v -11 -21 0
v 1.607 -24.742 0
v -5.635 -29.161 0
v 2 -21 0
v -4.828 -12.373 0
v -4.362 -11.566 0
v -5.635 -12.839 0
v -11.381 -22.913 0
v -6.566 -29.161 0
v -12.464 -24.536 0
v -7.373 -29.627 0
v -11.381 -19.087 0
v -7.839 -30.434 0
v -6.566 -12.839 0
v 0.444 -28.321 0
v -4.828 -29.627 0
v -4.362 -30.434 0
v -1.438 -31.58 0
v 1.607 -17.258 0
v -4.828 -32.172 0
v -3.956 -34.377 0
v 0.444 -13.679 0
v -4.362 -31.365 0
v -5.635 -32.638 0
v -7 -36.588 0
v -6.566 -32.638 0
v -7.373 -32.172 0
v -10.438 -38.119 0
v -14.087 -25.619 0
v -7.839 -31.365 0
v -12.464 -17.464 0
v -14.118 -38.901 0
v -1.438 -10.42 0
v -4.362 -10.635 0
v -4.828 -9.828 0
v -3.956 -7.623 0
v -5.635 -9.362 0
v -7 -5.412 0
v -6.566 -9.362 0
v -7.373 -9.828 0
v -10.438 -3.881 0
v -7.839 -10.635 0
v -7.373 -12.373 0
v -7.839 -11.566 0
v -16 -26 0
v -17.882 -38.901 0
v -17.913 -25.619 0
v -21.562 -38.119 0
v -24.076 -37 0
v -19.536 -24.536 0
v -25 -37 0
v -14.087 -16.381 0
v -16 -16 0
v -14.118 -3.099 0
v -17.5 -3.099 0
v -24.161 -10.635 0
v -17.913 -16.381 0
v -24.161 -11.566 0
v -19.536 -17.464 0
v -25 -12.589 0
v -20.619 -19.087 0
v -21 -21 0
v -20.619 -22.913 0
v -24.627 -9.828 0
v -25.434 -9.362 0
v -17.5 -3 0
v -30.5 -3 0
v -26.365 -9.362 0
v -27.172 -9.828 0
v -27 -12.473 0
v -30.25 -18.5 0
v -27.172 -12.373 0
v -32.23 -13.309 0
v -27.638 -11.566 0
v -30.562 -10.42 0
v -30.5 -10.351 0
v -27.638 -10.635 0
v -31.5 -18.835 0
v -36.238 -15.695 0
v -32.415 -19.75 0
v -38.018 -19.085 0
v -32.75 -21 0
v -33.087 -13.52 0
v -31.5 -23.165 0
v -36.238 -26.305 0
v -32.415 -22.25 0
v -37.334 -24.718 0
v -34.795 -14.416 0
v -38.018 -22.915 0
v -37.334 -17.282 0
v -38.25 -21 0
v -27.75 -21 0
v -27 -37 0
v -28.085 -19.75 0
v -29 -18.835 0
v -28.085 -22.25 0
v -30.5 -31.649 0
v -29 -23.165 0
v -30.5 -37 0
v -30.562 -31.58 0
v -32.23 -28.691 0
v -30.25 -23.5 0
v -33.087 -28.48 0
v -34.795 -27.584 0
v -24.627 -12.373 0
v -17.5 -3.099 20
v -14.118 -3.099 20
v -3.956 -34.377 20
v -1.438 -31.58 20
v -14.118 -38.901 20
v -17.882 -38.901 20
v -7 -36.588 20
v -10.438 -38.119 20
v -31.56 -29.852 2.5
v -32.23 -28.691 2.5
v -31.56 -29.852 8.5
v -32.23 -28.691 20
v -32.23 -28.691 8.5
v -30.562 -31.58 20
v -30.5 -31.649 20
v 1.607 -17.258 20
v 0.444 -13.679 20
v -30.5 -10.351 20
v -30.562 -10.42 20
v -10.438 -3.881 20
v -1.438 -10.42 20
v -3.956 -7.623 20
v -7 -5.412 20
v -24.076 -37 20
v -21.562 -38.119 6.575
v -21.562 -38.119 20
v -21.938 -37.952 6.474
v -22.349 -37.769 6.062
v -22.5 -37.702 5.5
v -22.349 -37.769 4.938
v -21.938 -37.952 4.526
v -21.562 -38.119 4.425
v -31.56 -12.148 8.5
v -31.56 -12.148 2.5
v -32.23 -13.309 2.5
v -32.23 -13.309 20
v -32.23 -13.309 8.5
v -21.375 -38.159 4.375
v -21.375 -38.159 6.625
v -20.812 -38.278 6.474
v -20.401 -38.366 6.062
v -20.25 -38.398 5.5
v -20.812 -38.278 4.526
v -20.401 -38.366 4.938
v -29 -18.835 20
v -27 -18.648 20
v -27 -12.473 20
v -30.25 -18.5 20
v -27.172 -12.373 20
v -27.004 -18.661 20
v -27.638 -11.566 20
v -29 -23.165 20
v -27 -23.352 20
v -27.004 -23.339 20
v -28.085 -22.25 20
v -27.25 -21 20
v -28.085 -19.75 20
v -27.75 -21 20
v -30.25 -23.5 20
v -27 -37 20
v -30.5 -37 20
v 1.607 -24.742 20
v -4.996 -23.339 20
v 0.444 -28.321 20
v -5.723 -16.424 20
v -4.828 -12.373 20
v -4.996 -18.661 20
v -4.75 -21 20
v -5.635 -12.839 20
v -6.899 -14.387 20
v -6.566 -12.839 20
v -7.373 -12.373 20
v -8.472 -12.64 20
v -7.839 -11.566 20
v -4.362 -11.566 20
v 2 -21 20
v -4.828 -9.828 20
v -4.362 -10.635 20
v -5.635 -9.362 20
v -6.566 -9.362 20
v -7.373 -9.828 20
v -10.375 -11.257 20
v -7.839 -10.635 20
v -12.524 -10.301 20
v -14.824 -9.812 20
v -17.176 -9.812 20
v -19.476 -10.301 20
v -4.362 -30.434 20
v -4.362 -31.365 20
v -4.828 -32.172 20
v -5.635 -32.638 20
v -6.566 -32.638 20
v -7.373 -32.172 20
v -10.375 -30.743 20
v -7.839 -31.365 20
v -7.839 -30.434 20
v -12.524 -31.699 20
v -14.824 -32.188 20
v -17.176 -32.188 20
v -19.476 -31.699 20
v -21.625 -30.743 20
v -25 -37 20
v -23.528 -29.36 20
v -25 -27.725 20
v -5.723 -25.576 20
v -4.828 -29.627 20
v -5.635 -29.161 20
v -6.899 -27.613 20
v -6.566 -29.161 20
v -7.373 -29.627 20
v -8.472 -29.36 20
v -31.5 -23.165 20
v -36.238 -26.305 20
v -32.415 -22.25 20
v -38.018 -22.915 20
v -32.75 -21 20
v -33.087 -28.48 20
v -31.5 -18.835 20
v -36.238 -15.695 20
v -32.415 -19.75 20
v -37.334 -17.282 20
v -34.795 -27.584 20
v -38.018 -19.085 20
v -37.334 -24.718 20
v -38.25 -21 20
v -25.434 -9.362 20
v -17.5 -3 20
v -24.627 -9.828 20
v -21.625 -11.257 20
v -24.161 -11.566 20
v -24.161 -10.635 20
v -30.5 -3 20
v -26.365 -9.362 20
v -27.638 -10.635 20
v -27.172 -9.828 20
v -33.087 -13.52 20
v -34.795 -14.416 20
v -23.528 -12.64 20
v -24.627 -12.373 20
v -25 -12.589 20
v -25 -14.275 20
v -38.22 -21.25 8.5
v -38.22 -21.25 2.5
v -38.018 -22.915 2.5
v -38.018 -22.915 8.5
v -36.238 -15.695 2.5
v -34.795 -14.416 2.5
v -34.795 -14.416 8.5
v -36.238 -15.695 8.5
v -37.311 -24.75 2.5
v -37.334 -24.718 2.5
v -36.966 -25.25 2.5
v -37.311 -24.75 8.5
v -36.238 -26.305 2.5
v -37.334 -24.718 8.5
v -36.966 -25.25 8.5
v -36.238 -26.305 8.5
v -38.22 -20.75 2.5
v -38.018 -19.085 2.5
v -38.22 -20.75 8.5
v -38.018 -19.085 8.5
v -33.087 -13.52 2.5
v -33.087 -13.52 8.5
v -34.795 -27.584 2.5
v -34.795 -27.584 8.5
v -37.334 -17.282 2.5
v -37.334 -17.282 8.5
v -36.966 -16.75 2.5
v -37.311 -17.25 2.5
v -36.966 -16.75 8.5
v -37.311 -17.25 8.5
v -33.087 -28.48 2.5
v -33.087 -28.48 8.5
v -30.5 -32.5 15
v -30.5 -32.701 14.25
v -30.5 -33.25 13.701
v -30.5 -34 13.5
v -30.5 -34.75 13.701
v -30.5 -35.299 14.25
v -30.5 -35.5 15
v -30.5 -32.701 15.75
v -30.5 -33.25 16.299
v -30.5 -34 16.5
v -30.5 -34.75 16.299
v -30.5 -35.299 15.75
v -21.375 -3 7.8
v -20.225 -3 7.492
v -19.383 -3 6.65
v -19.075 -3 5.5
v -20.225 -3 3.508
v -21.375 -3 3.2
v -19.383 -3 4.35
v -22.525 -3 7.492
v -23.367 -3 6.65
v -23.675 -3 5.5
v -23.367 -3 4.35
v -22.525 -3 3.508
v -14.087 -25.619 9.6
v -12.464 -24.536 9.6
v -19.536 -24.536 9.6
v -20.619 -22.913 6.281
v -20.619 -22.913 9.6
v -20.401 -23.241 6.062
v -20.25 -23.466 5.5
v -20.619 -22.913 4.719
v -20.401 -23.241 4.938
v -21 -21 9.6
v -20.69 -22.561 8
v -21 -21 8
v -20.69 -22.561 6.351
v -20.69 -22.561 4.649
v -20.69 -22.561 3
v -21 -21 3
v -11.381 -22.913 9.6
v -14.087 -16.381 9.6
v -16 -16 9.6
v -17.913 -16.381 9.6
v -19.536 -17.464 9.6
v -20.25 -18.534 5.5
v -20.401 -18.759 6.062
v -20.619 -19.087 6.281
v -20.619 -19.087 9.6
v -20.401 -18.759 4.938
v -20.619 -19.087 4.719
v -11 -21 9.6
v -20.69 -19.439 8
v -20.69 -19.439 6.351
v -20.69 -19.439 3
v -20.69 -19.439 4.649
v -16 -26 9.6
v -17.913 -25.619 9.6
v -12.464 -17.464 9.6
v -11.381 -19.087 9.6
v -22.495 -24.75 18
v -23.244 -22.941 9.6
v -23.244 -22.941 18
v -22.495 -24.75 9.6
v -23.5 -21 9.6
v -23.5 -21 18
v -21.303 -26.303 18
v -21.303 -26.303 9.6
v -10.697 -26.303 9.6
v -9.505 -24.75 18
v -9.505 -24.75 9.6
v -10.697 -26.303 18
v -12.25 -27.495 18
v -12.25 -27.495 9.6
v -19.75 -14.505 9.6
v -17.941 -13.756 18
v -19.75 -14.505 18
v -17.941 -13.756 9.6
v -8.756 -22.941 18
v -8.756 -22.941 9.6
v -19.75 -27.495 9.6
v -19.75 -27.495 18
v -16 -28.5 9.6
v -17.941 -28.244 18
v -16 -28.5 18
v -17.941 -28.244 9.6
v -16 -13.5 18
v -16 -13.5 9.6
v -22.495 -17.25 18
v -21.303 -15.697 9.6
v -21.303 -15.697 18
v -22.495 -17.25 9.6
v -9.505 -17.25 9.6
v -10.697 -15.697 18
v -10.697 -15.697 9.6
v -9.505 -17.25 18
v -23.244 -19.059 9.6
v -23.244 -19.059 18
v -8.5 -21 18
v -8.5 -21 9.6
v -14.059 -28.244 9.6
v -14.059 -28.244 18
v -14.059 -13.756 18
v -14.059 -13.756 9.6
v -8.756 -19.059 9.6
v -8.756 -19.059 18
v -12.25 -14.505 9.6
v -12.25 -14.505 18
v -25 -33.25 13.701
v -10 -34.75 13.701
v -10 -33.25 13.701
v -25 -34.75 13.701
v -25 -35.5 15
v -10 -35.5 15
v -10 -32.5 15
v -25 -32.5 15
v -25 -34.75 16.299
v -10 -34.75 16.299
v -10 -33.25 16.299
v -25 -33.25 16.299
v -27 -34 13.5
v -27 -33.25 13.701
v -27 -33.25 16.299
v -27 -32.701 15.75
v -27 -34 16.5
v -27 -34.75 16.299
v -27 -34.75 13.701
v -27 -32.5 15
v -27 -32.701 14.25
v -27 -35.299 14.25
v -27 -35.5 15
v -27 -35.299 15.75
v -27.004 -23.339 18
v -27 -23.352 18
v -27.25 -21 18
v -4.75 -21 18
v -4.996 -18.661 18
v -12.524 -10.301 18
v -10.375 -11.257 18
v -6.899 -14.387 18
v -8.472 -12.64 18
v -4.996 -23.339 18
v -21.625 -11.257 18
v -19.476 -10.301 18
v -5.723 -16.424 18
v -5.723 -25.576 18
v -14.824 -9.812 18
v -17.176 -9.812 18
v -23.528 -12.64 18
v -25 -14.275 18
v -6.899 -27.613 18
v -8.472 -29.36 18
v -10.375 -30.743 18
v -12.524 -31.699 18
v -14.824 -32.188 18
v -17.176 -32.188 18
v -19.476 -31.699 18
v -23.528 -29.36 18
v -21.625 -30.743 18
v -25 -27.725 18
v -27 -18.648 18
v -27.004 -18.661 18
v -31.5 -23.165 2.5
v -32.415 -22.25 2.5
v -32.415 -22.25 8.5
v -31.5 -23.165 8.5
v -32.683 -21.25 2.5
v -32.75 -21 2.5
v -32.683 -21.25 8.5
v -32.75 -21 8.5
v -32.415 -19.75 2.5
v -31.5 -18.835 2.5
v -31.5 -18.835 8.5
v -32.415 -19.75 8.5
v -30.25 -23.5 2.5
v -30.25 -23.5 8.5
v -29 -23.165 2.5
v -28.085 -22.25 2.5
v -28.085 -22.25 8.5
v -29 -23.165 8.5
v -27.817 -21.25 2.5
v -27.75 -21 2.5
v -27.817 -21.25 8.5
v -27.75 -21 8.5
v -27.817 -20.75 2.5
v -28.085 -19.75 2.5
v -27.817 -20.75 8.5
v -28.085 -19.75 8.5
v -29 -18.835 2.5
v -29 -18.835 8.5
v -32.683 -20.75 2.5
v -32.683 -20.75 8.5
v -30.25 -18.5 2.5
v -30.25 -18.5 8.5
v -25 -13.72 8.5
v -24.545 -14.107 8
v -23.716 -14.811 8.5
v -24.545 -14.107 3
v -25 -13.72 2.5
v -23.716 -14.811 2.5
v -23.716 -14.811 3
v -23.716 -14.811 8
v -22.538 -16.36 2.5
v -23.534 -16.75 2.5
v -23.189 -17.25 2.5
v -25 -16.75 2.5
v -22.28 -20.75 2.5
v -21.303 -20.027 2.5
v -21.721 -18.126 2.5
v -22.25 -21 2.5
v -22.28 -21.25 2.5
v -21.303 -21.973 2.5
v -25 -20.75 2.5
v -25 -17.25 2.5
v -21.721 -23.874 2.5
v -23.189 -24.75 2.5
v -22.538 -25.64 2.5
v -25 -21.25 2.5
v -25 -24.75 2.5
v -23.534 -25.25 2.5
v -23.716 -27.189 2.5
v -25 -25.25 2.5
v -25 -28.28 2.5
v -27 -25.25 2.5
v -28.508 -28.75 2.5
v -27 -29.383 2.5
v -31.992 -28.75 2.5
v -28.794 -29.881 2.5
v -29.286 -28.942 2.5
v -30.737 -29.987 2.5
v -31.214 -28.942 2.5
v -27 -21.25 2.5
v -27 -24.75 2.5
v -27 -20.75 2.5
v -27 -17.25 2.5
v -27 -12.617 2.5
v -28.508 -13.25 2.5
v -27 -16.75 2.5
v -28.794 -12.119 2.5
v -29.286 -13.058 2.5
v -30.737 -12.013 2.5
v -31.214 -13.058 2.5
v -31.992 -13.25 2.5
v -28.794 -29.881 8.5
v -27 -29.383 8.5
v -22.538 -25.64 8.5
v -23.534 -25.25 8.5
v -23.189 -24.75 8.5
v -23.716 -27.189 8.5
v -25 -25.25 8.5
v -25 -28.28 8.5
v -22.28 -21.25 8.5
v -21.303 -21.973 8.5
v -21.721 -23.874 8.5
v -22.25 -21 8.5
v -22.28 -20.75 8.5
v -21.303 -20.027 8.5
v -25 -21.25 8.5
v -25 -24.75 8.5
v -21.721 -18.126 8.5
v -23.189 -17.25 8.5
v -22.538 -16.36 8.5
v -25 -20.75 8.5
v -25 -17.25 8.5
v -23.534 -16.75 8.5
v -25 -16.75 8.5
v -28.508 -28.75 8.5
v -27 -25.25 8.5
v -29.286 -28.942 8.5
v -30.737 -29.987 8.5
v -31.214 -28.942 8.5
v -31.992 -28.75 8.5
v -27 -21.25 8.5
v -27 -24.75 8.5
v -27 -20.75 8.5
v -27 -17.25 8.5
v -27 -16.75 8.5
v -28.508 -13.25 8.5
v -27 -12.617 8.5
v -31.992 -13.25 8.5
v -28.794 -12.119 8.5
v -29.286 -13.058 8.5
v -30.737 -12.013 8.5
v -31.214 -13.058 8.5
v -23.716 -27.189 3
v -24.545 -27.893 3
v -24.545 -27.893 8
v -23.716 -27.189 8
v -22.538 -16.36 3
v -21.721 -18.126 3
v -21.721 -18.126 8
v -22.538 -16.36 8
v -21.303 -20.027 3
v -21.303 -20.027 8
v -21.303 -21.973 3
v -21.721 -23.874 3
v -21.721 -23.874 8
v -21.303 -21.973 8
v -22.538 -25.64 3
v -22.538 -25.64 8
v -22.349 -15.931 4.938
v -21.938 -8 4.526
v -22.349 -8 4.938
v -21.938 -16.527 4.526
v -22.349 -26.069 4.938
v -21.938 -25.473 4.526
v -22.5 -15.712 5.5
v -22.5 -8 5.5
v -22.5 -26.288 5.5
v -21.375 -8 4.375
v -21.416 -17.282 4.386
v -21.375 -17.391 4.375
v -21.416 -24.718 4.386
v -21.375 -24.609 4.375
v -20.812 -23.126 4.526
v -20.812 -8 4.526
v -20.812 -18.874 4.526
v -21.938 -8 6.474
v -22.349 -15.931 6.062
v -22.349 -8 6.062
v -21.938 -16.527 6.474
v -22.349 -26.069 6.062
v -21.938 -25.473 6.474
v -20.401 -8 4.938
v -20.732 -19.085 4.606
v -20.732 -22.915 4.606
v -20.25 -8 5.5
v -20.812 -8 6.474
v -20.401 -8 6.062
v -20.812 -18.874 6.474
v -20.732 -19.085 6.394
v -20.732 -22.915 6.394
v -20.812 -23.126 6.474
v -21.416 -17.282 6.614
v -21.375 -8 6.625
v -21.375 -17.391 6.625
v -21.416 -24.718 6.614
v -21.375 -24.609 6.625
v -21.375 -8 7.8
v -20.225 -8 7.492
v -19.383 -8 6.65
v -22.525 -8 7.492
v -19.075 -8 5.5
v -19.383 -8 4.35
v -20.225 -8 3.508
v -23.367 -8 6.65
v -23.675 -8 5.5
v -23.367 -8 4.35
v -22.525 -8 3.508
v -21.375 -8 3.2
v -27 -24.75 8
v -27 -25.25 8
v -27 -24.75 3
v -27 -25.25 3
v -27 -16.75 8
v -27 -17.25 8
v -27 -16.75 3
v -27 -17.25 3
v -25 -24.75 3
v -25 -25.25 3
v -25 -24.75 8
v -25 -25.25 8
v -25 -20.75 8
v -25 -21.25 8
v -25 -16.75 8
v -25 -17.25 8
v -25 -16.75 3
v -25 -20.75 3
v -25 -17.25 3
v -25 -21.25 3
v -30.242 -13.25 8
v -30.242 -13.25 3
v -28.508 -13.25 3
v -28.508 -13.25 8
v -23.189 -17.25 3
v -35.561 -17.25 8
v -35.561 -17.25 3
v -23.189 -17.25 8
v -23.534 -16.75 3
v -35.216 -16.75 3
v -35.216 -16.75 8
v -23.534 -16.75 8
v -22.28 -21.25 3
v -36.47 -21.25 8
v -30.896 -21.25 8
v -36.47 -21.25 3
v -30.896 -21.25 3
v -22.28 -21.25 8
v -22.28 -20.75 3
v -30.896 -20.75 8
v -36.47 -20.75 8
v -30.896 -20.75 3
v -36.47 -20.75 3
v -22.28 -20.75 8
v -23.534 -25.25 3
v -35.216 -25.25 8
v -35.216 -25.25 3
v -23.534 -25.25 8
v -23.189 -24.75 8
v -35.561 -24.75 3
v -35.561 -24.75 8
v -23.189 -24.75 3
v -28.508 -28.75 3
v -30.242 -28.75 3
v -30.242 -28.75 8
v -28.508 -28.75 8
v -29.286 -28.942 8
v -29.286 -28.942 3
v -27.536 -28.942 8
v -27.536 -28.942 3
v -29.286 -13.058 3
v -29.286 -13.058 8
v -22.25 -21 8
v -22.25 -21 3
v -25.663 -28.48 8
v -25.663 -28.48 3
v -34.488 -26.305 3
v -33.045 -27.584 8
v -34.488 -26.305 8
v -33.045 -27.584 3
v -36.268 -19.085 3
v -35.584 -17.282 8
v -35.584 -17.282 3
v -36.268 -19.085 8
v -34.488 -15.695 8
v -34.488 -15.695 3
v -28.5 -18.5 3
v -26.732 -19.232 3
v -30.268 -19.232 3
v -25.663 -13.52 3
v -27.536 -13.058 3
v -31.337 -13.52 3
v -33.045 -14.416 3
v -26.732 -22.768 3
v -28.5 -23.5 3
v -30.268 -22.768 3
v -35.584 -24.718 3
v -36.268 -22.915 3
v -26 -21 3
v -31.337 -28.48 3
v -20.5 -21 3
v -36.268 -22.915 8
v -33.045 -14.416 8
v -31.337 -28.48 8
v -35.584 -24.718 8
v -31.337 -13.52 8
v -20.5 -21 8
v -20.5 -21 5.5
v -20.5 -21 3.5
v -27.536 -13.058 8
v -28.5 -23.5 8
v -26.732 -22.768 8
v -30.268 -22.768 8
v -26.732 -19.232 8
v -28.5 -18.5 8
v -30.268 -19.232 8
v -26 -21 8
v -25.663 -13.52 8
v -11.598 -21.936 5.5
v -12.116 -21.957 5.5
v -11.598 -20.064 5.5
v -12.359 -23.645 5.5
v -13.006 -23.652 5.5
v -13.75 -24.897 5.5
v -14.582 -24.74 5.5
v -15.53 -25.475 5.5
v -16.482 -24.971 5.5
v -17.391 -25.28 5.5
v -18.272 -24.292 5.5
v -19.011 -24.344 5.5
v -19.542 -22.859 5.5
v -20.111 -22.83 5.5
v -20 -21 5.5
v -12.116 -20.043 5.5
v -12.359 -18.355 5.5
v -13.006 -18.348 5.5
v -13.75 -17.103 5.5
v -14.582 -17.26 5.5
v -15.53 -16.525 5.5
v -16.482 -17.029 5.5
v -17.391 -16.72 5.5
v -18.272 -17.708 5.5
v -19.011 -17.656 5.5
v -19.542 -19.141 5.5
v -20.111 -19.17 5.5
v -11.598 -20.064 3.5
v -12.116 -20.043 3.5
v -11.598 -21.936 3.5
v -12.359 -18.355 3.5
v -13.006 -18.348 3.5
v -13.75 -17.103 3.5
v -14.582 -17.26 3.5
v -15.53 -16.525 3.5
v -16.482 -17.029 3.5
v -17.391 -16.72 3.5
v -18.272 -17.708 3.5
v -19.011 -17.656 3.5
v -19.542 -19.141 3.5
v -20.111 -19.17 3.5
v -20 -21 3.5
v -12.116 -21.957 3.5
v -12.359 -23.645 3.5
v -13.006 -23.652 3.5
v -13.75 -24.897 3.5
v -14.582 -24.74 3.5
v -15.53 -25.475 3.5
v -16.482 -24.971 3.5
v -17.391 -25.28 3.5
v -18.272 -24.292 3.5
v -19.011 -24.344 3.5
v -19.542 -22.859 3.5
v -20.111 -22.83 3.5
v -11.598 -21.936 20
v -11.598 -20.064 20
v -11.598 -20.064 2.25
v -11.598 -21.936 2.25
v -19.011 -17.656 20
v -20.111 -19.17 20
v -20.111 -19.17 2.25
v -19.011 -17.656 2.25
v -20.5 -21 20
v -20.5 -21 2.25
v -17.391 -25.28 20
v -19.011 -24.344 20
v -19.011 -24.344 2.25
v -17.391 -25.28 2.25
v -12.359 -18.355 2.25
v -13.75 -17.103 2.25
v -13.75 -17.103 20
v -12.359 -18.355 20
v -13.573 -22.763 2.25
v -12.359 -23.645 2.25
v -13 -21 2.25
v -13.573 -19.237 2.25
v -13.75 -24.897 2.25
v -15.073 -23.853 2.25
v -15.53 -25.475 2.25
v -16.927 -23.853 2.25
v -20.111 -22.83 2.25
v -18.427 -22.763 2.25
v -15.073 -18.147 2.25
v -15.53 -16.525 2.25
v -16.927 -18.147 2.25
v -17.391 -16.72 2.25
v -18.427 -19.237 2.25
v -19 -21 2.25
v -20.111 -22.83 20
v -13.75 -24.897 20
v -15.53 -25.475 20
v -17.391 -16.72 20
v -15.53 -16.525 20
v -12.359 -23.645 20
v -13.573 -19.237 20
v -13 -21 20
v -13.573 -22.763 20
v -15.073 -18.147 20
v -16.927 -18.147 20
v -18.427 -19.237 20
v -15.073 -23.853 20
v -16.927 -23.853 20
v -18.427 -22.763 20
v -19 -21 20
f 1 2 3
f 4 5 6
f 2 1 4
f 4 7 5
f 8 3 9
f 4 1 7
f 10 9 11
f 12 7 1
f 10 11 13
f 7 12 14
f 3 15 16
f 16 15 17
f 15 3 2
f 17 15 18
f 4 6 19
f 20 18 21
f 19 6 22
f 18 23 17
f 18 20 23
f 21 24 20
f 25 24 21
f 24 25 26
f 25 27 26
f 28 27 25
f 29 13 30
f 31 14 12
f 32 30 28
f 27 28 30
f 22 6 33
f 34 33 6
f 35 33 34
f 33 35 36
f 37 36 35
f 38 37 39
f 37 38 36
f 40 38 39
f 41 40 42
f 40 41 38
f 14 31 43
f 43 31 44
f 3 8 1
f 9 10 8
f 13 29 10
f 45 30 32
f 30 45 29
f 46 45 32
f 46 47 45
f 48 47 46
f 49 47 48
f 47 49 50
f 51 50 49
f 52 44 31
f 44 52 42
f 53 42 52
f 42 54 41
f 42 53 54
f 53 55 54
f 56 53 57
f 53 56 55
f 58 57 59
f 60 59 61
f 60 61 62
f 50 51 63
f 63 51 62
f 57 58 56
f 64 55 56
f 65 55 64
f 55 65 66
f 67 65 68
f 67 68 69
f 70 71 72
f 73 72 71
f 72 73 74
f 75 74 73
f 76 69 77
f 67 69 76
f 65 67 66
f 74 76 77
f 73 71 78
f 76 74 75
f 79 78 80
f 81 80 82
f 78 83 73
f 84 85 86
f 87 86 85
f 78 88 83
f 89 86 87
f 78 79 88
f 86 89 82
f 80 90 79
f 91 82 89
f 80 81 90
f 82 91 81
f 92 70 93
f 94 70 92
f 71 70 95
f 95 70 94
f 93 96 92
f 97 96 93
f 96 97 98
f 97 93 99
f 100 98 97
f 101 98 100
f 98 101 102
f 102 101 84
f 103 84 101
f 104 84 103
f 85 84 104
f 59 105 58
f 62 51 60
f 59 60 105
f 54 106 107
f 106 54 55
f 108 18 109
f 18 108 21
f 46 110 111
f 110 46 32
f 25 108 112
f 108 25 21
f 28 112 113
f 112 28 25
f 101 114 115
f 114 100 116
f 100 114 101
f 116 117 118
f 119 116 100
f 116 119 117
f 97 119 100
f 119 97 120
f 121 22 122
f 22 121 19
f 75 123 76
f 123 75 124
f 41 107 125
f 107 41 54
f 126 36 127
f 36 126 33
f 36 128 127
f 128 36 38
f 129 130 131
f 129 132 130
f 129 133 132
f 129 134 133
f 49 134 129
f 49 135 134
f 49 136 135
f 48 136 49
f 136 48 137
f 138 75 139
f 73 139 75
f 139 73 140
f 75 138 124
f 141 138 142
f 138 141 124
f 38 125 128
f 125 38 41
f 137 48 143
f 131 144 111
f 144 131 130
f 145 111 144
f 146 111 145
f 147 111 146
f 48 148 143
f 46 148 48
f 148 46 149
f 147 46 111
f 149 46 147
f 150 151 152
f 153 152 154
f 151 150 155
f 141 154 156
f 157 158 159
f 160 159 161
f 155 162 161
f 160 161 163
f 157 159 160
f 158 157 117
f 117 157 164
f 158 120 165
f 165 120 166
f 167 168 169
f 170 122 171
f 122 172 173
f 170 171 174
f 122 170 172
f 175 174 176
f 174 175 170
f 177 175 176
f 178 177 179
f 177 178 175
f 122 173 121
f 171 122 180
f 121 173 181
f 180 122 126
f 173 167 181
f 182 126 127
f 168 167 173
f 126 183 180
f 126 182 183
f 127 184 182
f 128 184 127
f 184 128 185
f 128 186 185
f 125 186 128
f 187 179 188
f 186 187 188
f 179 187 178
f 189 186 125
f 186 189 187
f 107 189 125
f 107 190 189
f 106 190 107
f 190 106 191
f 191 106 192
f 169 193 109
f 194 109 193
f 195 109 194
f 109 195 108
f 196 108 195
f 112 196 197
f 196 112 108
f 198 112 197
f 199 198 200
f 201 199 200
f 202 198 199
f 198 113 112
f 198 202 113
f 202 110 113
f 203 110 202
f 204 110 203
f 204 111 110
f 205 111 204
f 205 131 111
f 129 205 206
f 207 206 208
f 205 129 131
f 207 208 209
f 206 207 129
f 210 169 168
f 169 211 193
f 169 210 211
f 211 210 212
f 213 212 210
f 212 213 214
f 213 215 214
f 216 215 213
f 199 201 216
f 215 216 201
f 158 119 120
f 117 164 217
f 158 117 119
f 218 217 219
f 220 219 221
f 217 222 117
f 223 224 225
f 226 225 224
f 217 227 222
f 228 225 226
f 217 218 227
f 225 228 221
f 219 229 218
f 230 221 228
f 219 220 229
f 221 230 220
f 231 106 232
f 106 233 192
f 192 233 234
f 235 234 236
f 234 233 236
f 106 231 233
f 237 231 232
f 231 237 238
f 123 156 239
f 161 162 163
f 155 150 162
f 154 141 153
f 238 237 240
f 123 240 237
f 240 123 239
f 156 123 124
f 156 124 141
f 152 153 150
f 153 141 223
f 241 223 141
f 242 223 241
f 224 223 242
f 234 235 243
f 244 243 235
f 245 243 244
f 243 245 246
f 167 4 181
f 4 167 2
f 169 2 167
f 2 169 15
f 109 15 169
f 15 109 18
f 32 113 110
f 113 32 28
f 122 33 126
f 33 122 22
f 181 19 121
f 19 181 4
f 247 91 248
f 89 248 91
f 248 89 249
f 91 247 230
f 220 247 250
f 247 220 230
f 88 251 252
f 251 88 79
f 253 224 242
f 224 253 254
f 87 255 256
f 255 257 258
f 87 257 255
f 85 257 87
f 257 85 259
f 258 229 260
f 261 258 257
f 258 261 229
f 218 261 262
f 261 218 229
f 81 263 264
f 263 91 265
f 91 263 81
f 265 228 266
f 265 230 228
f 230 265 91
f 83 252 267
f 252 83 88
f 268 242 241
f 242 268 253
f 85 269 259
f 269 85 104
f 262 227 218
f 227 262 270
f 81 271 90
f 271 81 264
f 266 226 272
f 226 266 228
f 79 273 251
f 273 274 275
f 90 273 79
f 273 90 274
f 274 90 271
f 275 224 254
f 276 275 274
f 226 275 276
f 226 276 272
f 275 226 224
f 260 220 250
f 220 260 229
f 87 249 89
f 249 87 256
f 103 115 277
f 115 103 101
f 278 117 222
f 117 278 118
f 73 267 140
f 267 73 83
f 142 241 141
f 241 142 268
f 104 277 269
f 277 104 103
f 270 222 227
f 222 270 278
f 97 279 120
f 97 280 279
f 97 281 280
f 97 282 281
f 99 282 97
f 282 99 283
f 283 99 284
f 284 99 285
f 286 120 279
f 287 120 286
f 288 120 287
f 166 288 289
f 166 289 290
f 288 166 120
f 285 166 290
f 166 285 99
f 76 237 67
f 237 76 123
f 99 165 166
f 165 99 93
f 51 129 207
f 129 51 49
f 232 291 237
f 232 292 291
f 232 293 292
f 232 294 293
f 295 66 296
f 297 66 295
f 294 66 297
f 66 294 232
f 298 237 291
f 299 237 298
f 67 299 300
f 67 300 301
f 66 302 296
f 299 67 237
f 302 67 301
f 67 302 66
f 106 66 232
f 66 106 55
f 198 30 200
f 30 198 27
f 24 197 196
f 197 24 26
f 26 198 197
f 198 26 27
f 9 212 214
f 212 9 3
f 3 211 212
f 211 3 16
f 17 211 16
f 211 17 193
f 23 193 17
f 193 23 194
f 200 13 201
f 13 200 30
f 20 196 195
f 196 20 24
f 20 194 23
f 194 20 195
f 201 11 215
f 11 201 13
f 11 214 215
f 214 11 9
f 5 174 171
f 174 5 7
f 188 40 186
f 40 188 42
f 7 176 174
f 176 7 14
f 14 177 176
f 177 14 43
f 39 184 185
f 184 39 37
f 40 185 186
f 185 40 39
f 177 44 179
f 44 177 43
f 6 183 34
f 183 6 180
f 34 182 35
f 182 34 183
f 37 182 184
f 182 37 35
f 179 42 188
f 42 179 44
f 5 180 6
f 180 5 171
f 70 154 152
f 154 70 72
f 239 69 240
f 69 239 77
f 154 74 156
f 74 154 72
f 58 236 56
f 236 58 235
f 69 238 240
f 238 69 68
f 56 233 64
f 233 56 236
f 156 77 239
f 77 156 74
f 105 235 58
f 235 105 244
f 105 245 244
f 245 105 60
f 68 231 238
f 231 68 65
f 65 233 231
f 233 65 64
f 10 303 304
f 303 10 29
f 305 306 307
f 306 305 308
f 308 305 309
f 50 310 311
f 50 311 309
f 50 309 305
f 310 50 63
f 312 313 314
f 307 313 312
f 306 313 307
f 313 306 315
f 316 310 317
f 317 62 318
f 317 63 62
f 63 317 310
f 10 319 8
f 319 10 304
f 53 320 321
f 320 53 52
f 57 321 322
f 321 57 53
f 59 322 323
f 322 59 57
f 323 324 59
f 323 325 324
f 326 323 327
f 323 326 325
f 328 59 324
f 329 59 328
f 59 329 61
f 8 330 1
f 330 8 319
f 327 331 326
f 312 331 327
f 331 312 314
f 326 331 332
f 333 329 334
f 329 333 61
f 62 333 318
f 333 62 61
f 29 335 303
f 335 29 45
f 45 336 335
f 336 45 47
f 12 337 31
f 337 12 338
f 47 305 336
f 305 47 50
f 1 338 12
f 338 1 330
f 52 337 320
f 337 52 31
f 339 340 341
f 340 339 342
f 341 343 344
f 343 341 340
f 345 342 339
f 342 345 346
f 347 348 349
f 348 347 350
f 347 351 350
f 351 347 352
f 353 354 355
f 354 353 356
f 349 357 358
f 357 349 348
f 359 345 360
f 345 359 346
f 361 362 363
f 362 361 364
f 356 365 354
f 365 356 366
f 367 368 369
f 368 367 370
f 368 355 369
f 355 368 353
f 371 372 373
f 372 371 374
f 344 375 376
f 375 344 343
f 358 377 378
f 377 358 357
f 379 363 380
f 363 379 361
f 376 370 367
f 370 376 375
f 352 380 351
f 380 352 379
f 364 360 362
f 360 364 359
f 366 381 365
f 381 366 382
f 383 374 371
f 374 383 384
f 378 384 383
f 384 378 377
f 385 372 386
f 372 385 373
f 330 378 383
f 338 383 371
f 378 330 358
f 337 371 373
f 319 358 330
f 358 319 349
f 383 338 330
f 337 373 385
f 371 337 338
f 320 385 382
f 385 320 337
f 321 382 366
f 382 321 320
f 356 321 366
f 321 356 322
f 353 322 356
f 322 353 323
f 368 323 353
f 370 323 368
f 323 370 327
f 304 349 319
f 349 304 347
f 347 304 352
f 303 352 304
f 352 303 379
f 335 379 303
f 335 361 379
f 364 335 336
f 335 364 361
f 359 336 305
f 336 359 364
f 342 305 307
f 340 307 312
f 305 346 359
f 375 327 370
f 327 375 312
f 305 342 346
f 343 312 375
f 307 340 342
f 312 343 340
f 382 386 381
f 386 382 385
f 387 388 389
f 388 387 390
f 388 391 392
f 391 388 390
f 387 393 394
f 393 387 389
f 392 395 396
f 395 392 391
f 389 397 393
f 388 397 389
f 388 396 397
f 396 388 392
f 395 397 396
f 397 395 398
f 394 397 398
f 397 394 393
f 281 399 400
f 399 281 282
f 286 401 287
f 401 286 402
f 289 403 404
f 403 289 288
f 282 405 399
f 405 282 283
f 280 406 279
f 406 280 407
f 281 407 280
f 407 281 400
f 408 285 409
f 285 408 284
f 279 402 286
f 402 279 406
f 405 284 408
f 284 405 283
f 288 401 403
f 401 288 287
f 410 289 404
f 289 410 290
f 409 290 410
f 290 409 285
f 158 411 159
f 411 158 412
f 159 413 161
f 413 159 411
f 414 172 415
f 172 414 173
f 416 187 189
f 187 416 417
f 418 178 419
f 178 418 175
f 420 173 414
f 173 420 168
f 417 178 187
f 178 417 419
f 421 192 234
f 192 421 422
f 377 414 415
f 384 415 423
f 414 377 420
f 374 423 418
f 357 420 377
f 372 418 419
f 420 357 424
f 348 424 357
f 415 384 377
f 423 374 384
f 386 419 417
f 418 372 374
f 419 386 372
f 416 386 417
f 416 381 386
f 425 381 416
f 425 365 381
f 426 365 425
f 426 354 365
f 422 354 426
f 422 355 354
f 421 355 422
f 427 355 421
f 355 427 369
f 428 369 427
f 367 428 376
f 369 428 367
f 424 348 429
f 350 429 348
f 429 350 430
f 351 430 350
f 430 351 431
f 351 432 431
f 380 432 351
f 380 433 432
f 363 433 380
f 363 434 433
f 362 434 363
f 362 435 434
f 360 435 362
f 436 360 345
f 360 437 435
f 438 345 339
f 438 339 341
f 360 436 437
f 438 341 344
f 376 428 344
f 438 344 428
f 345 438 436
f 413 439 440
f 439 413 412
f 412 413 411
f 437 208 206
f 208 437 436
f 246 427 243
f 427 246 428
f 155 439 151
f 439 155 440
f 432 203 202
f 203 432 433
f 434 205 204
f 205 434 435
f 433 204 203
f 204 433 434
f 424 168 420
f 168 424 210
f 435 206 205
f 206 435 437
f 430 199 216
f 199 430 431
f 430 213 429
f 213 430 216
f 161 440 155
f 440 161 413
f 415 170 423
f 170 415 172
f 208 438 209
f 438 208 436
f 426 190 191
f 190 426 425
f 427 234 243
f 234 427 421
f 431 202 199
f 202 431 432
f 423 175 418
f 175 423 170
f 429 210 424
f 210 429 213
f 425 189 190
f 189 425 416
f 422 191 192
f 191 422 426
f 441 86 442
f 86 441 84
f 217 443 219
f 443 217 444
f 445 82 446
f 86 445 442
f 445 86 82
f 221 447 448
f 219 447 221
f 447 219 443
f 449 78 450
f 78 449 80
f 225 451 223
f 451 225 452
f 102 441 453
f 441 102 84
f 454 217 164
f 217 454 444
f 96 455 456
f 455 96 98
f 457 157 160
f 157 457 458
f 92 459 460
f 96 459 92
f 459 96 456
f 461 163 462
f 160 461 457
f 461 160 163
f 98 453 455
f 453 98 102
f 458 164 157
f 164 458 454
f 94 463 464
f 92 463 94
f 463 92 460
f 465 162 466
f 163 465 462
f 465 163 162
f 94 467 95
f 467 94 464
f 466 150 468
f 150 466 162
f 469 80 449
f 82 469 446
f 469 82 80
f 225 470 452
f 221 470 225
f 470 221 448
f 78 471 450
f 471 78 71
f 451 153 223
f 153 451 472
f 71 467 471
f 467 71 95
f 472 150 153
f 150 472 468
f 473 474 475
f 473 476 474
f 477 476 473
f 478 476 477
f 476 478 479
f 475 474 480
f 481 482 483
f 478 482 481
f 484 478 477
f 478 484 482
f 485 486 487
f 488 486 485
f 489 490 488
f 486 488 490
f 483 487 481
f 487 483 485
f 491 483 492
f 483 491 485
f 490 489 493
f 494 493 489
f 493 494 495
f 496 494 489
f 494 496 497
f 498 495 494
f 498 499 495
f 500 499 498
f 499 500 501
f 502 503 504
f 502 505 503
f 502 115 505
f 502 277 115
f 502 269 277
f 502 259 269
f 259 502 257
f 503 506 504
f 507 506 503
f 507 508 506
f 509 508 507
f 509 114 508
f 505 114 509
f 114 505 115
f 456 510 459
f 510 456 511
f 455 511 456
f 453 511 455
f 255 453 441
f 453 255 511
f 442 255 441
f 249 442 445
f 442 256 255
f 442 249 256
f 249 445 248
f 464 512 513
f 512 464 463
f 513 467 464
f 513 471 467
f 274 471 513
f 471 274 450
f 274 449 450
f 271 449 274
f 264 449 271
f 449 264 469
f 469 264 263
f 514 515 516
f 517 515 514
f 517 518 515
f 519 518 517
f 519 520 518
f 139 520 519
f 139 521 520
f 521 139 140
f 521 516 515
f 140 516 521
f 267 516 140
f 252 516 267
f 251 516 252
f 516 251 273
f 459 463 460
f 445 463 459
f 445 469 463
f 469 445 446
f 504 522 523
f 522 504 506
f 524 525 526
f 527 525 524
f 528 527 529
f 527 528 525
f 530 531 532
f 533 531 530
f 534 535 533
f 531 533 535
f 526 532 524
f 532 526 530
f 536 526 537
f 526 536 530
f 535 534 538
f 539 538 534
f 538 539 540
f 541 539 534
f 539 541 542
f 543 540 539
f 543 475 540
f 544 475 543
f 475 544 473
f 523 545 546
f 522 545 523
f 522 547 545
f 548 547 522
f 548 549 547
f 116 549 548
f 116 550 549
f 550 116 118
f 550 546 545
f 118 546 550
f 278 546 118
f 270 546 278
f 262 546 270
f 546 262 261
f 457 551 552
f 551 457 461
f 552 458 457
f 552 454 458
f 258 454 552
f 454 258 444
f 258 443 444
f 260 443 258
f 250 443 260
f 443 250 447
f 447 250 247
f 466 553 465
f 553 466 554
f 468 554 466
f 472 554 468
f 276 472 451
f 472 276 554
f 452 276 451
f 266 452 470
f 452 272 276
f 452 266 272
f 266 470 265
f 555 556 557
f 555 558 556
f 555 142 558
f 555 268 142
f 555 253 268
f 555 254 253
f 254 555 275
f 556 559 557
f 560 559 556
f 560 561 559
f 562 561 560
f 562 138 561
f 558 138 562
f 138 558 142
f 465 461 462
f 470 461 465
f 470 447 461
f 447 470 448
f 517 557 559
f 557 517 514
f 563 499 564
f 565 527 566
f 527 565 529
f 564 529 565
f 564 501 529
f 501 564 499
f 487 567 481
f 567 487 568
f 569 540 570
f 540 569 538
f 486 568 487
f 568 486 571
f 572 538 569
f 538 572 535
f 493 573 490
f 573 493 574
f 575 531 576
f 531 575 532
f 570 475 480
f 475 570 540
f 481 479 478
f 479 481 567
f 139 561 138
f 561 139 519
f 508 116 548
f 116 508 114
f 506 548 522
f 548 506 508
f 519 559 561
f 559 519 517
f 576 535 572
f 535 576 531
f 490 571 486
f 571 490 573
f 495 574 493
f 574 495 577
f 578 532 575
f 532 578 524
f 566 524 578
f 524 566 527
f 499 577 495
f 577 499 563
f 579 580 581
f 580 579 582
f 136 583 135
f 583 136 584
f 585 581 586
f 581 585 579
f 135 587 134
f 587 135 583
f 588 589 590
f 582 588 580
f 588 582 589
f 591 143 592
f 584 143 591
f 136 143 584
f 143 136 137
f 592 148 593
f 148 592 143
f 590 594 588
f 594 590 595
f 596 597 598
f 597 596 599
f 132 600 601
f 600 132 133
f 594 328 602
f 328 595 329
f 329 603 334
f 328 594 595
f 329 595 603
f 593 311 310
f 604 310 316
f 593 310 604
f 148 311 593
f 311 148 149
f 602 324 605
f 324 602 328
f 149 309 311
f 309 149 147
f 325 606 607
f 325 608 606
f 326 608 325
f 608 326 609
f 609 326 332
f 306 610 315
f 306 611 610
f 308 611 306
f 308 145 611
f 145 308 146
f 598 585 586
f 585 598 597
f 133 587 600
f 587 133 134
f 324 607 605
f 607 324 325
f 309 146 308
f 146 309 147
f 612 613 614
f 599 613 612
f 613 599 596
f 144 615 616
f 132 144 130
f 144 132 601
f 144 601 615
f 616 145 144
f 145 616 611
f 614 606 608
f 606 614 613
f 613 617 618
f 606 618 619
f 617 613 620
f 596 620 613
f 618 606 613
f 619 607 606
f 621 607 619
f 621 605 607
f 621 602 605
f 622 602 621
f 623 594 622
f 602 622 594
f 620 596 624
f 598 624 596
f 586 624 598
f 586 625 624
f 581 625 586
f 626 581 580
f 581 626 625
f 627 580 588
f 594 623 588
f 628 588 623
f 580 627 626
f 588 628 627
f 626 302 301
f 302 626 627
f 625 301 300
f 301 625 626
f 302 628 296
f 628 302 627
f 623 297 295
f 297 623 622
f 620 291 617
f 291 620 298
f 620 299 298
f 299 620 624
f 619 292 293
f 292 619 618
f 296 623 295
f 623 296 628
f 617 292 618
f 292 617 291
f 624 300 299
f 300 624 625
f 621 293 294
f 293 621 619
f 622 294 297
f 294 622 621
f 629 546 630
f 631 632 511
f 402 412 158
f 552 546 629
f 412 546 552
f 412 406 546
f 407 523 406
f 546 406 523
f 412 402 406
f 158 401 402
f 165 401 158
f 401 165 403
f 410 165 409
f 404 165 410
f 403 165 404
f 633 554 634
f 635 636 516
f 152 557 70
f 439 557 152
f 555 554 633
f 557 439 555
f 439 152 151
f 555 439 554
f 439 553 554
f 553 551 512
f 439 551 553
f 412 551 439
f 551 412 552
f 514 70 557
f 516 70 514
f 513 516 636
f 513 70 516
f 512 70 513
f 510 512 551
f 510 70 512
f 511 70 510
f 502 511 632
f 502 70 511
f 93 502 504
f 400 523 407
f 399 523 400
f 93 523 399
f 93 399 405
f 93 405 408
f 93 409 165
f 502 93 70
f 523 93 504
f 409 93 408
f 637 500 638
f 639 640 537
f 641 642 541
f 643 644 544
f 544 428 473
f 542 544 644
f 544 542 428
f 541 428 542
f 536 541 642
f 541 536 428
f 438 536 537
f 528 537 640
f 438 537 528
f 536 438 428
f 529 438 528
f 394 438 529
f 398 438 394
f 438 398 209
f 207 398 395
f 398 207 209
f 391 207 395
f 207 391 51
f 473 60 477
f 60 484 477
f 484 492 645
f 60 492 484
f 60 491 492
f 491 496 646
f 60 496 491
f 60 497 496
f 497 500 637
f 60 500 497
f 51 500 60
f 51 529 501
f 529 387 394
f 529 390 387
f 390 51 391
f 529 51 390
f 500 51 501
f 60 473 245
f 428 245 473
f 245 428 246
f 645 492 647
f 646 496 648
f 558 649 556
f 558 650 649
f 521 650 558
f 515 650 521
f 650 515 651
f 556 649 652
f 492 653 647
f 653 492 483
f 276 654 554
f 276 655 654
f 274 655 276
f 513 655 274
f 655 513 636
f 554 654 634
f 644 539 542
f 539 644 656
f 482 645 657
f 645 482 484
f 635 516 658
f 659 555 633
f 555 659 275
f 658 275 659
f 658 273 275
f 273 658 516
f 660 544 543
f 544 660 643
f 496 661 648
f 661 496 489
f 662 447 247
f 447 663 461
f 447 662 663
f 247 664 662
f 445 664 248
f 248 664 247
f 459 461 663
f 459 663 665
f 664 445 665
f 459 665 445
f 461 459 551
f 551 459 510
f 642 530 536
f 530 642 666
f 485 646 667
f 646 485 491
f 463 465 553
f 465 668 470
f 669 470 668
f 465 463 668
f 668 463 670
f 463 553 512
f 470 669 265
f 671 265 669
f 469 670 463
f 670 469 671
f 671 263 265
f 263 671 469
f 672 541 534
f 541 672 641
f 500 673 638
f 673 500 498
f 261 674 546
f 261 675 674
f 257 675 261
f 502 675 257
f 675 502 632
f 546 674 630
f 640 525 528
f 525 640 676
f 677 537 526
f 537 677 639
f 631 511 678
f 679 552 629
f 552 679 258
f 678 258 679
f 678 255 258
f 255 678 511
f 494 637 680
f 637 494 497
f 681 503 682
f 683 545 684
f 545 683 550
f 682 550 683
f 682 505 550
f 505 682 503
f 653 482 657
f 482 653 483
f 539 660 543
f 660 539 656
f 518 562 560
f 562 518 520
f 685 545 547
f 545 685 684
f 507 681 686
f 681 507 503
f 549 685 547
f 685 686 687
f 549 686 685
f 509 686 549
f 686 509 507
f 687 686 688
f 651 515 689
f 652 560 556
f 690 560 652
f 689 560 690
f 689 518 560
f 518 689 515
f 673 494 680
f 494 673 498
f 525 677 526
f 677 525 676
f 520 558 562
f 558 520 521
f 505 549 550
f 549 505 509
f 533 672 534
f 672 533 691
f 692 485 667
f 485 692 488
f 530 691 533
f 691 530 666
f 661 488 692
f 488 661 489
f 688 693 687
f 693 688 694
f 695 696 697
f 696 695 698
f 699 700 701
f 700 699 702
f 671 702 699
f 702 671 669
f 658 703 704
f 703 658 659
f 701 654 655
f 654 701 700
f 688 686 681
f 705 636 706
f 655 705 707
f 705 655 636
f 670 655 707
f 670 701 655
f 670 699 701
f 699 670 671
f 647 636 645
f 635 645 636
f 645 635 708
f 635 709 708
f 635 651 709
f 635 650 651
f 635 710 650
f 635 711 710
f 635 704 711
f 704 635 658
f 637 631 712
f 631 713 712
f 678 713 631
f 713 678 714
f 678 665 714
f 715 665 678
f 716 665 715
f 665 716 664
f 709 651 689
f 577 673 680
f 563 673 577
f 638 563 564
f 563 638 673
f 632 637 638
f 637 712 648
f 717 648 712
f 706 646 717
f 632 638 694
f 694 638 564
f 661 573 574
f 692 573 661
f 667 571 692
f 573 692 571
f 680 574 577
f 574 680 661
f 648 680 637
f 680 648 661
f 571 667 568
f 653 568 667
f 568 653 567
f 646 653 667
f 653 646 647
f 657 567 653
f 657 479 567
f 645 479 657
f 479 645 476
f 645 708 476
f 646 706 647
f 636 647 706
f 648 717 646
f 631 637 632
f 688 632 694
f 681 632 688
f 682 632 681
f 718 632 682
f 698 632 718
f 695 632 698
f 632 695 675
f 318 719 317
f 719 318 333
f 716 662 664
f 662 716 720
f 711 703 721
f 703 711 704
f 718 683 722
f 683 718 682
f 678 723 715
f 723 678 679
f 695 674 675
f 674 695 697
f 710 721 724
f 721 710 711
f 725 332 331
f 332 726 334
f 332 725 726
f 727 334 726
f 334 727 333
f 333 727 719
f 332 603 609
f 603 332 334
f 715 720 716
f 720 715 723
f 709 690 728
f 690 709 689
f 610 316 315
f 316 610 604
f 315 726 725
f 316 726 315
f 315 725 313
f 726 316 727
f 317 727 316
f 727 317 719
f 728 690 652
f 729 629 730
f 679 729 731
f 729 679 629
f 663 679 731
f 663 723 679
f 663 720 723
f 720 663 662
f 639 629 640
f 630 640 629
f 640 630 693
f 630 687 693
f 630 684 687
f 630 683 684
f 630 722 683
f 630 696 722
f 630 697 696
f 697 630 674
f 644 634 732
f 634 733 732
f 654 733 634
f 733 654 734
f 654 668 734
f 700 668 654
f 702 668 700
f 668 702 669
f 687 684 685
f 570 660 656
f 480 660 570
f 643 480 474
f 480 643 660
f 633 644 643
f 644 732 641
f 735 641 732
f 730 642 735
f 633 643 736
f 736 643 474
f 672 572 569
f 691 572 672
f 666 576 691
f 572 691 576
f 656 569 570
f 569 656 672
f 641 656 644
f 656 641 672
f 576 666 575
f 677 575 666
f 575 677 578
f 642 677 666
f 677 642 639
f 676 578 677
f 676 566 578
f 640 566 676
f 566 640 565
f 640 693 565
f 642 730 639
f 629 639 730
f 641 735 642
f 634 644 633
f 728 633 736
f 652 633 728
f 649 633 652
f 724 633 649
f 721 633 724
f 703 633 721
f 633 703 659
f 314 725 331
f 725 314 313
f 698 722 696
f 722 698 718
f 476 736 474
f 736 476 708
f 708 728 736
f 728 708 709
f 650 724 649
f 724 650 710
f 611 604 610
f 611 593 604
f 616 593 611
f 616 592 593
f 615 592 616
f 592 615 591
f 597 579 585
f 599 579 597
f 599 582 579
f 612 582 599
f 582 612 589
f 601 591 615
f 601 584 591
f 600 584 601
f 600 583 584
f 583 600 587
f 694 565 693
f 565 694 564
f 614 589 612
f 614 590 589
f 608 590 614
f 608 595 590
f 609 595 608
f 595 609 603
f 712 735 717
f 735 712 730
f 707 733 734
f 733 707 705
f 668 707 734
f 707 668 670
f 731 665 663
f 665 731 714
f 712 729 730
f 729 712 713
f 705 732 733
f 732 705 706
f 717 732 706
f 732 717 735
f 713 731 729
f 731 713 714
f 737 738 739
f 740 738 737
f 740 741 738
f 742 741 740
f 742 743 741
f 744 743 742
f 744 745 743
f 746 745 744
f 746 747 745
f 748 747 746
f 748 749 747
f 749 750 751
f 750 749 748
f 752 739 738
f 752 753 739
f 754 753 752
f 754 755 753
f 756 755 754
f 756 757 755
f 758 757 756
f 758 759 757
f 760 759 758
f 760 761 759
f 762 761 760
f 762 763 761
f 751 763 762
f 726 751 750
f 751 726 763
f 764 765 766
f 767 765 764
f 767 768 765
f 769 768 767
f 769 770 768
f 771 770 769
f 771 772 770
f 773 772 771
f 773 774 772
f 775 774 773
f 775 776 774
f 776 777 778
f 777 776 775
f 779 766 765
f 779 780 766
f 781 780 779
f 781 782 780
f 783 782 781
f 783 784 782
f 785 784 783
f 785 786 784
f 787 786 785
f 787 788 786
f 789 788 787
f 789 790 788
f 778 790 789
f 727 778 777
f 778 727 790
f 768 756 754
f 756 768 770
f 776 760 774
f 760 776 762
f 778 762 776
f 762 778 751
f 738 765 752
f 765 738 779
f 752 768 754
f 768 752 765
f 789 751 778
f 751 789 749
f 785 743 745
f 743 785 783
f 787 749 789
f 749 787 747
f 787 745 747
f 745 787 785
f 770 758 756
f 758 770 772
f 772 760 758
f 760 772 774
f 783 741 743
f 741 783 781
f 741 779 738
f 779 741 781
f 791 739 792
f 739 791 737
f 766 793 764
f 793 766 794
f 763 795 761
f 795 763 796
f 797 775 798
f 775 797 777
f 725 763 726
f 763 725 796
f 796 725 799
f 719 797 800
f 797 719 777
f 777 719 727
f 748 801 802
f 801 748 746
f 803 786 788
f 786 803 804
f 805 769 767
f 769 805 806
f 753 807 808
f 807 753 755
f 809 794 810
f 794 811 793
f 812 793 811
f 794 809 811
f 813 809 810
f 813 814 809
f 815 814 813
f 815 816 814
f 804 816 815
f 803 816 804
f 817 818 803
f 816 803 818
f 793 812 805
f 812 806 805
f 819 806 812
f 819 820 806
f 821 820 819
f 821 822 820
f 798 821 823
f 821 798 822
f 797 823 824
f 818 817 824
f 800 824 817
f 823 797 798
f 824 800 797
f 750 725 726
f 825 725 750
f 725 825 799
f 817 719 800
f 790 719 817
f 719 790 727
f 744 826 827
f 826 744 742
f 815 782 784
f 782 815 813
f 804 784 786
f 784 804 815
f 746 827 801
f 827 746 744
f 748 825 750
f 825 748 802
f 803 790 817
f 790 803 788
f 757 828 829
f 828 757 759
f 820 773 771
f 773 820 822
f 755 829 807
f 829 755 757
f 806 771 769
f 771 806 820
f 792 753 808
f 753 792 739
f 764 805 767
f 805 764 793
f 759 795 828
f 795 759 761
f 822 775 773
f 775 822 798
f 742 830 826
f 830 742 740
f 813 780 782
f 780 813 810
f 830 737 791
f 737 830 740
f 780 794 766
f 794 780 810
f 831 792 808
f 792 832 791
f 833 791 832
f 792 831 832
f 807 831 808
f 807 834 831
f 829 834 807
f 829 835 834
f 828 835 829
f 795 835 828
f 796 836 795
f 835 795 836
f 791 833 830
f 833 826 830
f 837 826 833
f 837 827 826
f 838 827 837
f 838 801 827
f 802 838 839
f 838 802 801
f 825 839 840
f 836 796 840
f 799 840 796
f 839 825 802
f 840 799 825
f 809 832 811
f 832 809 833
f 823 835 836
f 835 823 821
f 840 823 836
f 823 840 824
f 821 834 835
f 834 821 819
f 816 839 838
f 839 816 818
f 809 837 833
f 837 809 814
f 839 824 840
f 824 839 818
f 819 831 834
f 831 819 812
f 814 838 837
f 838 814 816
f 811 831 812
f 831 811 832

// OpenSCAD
/*
   Parametrified Mini Bowden Extruder by m.Neuhauser ( m.neuhauser@gmail.com )

   Primary goal for this parametric extruder is to use this simple
   design for every possible combination of screwheads,
   bearings, diameters and dimensions you have laying around
   so you don't have to buy any specific parts.

   Second goal was to design it to handle flexible filament,
   should be possible, but untested yet.

   Based on "Makergear Filament drive goes Bowden" by Luke321
http://www.thingiverse.com/thing:63674
 */


// To print set flip_output to true:
flip_output = true;

// Bearing & Bolt toggle:
simulation_toggle = true;

m3_nut_diameter            = 3;     // diameter of screw to mount the extruder and tighten the clamp
bearing_diameter           = 16;
bearing_inner_diameter     = 5;
bearing_height             = 5;
bearing_offset             = 0.5;   // Amount to add for bearing chamber (not really used)
hobbed_bolt_diameter       = 9;
hobbed_bolt_inner_diameter = 6;
hobbed_bolt_height         = 17.75; // measured from the mounting plate of the stepper
filament_z_offset          = 14.5;  // offset between mountplate of stepper and
extruder_height            = 20;
extruder_diameter          = 34;    // 25-40 mm - use the diameter of the mounting plate of the stepper
filament_diameter          = 1.75;


// DO NOT CHANGE ANYTHING BELOW THIS LINE!


m3_nut_radius = (m3_nut_diameter/2)+0.3;
m3_wide_radius = m3_nut_diameter/2; 
x_center = 16;
y_center = 21;
filament_offset = x_center+(hobbed_bolt_diameter/2)+(filament_diameter/2);
hobbed_bolt_filament_height = filament_z_offset;

module bearing() {
	color("red")
		translate([bearing_diameter/2+hobbed_bolt_diameter/2+x_center,0-y_center,filament_z_offset-bearing_height/2])
		difference() {
			cylinder(bearing_height, bearing_diameter/2, bearing_diameter/2);
			translate([0,0,-0.5]) cylinder(bearing_height+1, bearing_inner_diameter/2, bearing_inner_diameter/2);

		}
}


module hobbed_bolt() {
	color("green")
		translate([x_center,0-y_center,0])
		difference () {
			cylinder(hobbed_bolt_height,hobbed_bolt_diameter/2,hobbed_bolt_diameter/2);
			translate([0,0,-0.5]) cylinder(hobbed_bolt_height+1, hobbed_bolt_inner_diameter/2, hobbed_bolt_inner_diameter/2);

			translate([0,0,filament_z_offset])
				difference() {
					cylinder(2,hobbed_bolt_diameter/2+1,hobbed_bolt_diameter/2+1);
					cylinder(2,hobbed_bolt_diameter/2-0.5,hobbed_bolt_diameter/2-0.5);
				}
		}
}


module extruder() {
	rotate([90, 0, 0])
		difference() {
			union() {
				//main cylinder
				translate([16,extruder_height,21]) rotate([90,0,0]) cylinder(h=extruder_height, r=(extruder_diameter/2)+1);

				//bearing mount
				translate([bearing_diameter/2+hobbed_bolt_diameter/2+x_center+filament_diameter,extruder_height,21]) rotate([90,0,0]) cylinder (h=extruder_height, r=bearing_diameter/2);

				//pushfit/pneufit mount
				translate([filament_offset-5, 0, 4])
					cube([10, extruder_height, extruder_diameter/2]);

				//filament support
				translate([hobbed_bolt_diameter/2+x_center,filament_z_offset,extruder_diameter/2]) rotate([0,0,0]) cylinder (h=8, r=3, $fn=12);

				//clamp
				translate([hobbed_bolt_diameter/2+x_center-3, 0, 3]) cube([13, extruder_height, extruder_diameter]);
			}

			//pulley opening
			translate([16,extruder_height+1,21]) rotate([90,0,0]){
				cylinder (h=extruder_height+2, r=(hobbed_bolt_diameter/2)+0.5);
				//open pulley opening a bit more for the pulley-screw
				translate([0,0,extruder_height-filament_z_offset+5.1]){
					cylinder (h=filament_z_offset-5, r1=(hobbed_bolt_diameter/2)+3, r2=(hobbed_bolt_diameter/2)+3);
				}

				rotate([0,0,45]) {
					//translate([14,0,0-(extruder_height/2)]) cylinder(h=22, r=1.6, $fn=12);
					translate([0,14,0]) cylinder(h=extruder_height+2, r=m3_nut_radius, $fn=12);
					translate([-14,0,0]) cylinder(h=extruder_height+2, r=m3_nut_radius, $fn=12);
					translate([0,-14,0]) cylinder(h=extruder_height+2, r=m3_nut_radius, $fn=12);
				}
			}

			//gearhead indentation
			translate([16,2,21]) rotate([90,0,0]) cylinder (h=4, r=11.25);

			//pulley hub indentation
			//translate([16,20-2,21]) rotate([90,0,0]) cylinder (h=5.6, r=7);

			//bearing screws
			translate([bearing_diameter/2+hobbed_bolt_diameter/2+x_center+filament_diameter,21,21]) rotate([90,0,0]) cylinder (h=extruder_height+2, r=bearing_inner_diameter/2, $fn=12);
			//translate([bearing_diameter/2+hobbed_bolt_diameter/2+x_center+filament_diameter,22,21]) rotate([90,30,0]) cylinder (h=5.3, r=bearing_inner_diameter/2*1.625, $fn=6);

			//bearing
			difference() {
				union() {
					translate([bearing_diameter/2+hobbed_bolt_diameter/2+x_center+filament_diameter,filament_z_offset+((bearing_height+1)/2),y_center]) rotate([90,0,0])
						cylinder (h=bearing_height+1, r=bearing_diameter/2+1);
				}

			}

			//filament path chamber
			//translate([filament_offset,filament_z_offset,15]) rotate([0,0,0]) 
			cylinder(h=3, r1=0.5, r2=3, $fn=12);

			//filament path
			translate([filament_offset,filament_z_offset,-10]) rotate([0,0,0]) #
				cylinder(h=60, r=(filament_diameter/2)+0.25, $fn=12);

			//pushfit/pneufit mount
			translate([filament_offset, filament_z_offset, 0])  cylinder(r=2.3, h=8, $fn=12);

			//clamp slit
			translate([25,-1,10]) cube([2, extruder_height+2, 35]);

			//clamp screws
			if (extruder_height/2 >= (filament_z_offset)) {
				translate([10,extruder_height/4*3,extruder_diameter]) rotate([0,90,0])
					cylinder(h=16, r=m3_nut_radius-0.3, $fn=6);
				translate([26,extruder_height/4*3,extruder_diameter]) rotate([0,90,0])
					cylinder(h=8, r=m3_wide_radius, $fn=12);
			}

			if (extruder_height/2 <= (filament_z_offset)) {
				translate([10,extruder_height/4,extruder_diameter]) rotate([0,90,0])
					cylinder(h=16, r=m3_nut_radius-0.3, $fn=6);
				translate([26,extruder_height/4,extruder_diameter]) rotate([0,90,0])
					cylinder(h=8, r=m3_wide_radius, $fn=12);
			}


		}
}



module supports() {
	difference() {
		rotate([90,0,0])
			for (z = [21-(bearing_diameter/2):4:21+(bearing_diameter/2)]) {
				translate([bearing_diameter/2+hobbed_bolt_diameter/2+x_center+filament_diameter, filament_z_offset, z])  cube([bearing_diameter, bearing_height+1, 0.5], center=true);
			}


		difference() {
			translate([bearing_diameter/2+hobbed_bolt_diameter/2+x_center,0-y_center,(filament_z_offset-bearing_height/2)-3])
				cylinder(bearing_height+10, (bearing_diameter/2)+20, (bearing_diameter/2)+20);
			color("blue")
				translate([bearing_diameter/2+hobbed_bolt_diameter/2+x_center+filament_diameter,0-y_center,(filament_z_offset-bearing_height/2-5)])
				cylinder(bearing_height+10, (bearing_diameter/2), (bearing_diameter/2));
		}
		translate([25,0-extruder_diameter-3,0]) cube([2, extruder_diameter, extruder_height+1]);


	}
}

module output(){
	output_rotation = flip_output == true ? 180 : 0;
	output_z_translate = flip_output == true ? 0-extruder_height : 0;
	rotate([0,output_rotation,0]) translate([0,0,output_z_translate]) {
		extruder();
		supports();
		if (simulation_toggle == true) {
			bearing();
			hobbed_bolt();
		}
	}
}

output();
